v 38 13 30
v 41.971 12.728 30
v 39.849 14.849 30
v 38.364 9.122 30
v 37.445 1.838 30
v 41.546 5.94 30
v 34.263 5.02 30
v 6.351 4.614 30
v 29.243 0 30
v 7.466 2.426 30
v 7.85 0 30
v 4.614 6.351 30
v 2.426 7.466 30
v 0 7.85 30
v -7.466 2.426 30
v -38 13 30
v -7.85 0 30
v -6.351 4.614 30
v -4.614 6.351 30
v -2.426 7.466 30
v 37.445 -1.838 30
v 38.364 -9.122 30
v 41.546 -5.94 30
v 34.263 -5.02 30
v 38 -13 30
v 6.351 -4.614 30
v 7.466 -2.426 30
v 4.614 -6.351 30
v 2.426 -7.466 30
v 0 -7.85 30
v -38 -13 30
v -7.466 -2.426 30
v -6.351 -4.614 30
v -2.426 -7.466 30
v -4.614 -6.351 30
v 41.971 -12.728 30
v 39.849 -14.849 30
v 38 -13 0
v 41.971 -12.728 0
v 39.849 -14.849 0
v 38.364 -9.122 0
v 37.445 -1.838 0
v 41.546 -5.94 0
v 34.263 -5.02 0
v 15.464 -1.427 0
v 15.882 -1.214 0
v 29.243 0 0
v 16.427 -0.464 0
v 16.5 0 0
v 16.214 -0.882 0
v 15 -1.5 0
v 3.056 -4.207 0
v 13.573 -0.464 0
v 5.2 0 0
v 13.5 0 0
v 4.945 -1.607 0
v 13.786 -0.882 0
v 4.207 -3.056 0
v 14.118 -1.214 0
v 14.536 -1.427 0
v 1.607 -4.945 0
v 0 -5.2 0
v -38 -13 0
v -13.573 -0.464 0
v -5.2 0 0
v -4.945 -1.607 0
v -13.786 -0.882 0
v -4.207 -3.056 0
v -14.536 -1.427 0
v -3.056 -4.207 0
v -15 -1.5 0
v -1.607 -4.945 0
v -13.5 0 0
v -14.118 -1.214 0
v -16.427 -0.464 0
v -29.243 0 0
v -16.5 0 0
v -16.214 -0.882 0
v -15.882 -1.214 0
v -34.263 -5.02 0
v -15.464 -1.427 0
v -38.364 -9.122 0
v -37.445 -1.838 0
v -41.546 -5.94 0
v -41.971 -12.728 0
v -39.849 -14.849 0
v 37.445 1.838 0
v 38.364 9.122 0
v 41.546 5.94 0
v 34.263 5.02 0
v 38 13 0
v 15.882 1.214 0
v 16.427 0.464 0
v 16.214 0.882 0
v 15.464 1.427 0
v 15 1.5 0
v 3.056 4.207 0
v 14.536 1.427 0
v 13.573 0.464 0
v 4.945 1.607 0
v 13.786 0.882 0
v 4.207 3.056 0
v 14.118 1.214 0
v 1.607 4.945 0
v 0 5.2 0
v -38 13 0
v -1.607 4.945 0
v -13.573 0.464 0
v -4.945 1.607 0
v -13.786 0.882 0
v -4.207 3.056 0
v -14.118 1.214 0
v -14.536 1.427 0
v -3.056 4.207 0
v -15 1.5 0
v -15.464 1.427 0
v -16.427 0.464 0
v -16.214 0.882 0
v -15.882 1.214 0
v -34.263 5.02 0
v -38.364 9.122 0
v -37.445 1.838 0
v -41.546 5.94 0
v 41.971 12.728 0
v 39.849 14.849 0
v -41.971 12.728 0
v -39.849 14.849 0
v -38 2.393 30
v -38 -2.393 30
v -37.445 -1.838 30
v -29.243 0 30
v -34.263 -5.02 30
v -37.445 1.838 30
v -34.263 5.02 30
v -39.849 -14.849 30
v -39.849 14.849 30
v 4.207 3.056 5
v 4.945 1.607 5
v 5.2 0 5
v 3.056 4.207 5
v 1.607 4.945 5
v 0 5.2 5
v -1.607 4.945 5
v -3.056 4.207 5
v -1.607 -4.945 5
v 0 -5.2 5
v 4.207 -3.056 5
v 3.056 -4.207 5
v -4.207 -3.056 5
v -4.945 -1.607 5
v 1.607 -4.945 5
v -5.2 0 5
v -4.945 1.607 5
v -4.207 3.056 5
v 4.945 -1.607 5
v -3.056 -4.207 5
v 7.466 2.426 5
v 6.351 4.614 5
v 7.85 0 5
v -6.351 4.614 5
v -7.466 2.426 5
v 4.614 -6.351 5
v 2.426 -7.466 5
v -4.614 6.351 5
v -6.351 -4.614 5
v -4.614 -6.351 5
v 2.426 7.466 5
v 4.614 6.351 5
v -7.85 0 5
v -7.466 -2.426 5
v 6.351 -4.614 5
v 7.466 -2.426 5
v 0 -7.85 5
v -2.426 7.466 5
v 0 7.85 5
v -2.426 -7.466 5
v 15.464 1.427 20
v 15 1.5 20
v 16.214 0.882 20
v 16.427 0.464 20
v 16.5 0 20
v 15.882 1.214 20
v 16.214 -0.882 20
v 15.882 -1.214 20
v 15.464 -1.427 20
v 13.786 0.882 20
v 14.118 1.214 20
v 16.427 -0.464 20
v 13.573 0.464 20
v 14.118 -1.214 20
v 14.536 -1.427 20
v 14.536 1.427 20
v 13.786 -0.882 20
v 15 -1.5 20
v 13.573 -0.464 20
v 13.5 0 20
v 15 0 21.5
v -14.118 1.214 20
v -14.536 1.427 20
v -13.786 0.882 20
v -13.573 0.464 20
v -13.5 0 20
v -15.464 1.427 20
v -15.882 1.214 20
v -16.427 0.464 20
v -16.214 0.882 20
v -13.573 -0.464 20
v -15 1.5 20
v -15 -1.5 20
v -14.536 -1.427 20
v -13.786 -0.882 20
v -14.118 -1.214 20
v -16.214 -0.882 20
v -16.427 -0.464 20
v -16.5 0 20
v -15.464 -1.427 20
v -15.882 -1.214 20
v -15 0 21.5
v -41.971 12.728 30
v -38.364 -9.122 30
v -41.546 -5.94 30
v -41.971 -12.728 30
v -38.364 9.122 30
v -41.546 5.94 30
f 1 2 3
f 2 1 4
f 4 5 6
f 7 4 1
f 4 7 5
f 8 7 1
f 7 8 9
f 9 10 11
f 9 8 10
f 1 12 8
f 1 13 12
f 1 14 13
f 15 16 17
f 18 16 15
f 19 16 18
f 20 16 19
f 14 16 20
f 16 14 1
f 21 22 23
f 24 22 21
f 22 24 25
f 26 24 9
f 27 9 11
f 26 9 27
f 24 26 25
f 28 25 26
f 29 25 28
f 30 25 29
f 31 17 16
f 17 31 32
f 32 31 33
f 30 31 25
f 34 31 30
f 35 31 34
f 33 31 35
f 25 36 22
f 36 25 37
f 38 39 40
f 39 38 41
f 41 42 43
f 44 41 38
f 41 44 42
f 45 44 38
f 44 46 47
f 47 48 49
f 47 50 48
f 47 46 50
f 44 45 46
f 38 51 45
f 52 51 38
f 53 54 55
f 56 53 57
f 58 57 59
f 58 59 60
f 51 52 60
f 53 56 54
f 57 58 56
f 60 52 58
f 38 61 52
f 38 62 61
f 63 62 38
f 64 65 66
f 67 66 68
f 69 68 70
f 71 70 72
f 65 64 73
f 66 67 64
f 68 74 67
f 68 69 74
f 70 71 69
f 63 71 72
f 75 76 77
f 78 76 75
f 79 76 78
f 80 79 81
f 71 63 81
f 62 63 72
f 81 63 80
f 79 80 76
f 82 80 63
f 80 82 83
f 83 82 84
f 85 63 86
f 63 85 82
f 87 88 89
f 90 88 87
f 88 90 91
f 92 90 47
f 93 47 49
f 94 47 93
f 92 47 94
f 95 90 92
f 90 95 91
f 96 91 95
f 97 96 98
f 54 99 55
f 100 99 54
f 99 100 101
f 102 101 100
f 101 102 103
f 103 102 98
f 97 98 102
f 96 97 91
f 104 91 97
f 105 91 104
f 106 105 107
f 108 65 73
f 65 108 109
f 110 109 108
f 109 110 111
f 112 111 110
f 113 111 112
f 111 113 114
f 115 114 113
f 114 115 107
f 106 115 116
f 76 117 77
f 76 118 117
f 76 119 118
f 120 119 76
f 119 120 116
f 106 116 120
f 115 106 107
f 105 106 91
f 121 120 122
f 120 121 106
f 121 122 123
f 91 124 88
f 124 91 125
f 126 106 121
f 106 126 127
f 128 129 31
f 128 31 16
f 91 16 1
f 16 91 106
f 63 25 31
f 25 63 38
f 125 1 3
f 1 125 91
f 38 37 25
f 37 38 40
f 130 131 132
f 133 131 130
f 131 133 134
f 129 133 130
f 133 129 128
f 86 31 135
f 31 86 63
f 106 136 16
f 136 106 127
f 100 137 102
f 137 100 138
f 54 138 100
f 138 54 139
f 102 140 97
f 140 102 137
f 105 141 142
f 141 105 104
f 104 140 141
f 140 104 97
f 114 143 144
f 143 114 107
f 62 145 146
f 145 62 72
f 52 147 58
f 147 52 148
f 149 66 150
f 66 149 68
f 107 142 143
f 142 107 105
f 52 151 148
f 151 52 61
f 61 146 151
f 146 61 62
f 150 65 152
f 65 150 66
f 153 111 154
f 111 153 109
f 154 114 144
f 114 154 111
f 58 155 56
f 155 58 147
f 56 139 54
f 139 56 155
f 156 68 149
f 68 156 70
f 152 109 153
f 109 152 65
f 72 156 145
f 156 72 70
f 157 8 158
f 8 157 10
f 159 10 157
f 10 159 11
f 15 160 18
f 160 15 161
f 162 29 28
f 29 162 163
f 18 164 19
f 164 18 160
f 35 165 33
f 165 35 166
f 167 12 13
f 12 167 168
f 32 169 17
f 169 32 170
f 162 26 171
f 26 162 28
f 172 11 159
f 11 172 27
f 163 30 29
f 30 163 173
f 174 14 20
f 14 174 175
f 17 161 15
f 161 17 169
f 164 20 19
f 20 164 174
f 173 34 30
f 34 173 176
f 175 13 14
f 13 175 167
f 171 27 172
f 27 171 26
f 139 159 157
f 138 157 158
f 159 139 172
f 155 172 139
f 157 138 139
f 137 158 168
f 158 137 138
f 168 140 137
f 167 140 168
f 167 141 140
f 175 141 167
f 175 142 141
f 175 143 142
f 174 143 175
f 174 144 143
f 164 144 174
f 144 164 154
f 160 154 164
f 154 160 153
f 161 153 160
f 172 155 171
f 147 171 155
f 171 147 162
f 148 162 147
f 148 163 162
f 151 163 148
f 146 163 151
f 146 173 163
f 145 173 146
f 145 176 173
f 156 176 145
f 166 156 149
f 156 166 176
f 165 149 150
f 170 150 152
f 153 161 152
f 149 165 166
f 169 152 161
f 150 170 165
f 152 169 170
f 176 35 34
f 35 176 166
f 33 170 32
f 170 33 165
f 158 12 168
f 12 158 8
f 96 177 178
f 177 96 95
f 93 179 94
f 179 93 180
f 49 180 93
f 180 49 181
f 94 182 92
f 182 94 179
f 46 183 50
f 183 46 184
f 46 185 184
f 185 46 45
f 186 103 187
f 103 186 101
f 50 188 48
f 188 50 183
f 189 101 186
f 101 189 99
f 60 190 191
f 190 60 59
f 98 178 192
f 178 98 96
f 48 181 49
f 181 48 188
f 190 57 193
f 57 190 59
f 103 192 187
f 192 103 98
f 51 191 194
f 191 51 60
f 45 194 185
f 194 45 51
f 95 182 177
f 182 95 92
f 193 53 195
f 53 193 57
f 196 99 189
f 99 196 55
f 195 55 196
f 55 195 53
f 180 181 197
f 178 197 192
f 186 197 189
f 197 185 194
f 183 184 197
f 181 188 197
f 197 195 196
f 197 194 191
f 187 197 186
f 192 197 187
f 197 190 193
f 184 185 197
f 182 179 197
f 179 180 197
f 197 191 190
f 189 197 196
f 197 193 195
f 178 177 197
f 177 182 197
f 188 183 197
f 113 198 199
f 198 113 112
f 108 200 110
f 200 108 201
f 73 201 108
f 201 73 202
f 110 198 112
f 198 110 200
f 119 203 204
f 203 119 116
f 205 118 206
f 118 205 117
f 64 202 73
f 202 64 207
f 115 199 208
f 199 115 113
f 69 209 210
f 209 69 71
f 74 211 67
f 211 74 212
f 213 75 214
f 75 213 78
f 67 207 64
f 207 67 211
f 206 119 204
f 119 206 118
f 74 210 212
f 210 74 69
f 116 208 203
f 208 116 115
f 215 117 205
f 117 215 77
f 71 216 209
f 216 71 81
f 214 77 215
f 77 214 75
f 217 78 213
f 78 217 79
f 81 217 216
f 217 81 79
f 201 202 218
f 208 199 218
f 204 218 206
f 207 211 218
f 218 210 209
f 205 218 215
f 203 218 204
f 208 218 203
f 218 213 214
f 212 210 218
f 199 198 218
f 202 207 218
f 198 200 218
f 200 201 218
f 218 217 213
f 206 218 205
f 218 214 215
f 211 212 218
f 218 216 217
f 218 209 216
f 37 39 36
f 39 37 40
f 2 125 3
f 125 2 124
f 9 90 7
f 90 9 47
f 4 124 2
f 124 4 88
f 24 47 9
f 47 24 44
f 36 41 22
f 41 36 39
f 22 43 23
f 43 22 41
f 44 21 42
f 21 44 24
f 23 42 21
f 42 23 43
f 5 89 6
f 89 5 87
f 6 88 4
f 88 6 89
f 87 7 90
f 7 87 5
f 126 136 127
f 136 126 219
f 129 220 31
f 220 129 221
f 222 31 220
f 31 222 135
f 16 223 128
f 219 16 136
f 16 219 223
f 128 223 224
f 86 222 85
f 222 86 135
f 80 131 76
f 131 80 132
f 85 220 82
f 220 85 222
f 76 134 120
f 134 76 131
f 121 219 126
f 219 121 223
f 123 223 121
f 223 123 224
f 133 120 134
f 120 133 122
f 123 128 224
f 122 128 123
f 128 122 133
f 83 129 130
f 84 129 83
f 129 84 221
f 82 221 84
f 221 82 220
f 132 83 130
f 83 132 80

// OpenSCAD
$fn = 20;

diametreTubeExt = 15.7;
diametreTige = 10.4;

difference() {
	translate([-38, -13,0]) cube([76, 26, 30]);
	translate([25, 0,0]) rotate(-45) cube([20, 20, 30]);
	translate([-25, 0,0]) rotate(135) cube([20, 20, 30]);
	cylinder(h = 100, r = diametreTige / 2); // Empreinte de la tige filetée
	translate([0, 0, 5]) cylinder(h = 30, r = diametreTubeExt / 2); // Empreinte du tube guide
	translate([15, 0, -10]) cylinder(h = 30, r = 1.5); // Empreinte de vis
	translate([15, 0, 20]) cylinder(h = 1.5, r1 = 1.5, r2 = 0);
	translate([-15, 0, -10]) cylinder(h = 30, r = 1.5); // Empreinte de vis
	translate([-15, 0, 20]) cylinder(h = 1.5, r1 = 1.5, r2 = 0);
}
translate([25, 0,0]) rotate(-45) extremite();
translate([-25, 0,0]) rotate(135) extremite();

module extremite() {
	difference() {
		cube([21, 21, 30]);
		translate([3, 3, 0]) cube([21, 21, 30]);
	}
	translate([10.1, 3, 0]) cube([5.8, 4.5, 30]);
	translate([3, 10.1, 0]) cube([4.5, 5.8, 30]);
}
